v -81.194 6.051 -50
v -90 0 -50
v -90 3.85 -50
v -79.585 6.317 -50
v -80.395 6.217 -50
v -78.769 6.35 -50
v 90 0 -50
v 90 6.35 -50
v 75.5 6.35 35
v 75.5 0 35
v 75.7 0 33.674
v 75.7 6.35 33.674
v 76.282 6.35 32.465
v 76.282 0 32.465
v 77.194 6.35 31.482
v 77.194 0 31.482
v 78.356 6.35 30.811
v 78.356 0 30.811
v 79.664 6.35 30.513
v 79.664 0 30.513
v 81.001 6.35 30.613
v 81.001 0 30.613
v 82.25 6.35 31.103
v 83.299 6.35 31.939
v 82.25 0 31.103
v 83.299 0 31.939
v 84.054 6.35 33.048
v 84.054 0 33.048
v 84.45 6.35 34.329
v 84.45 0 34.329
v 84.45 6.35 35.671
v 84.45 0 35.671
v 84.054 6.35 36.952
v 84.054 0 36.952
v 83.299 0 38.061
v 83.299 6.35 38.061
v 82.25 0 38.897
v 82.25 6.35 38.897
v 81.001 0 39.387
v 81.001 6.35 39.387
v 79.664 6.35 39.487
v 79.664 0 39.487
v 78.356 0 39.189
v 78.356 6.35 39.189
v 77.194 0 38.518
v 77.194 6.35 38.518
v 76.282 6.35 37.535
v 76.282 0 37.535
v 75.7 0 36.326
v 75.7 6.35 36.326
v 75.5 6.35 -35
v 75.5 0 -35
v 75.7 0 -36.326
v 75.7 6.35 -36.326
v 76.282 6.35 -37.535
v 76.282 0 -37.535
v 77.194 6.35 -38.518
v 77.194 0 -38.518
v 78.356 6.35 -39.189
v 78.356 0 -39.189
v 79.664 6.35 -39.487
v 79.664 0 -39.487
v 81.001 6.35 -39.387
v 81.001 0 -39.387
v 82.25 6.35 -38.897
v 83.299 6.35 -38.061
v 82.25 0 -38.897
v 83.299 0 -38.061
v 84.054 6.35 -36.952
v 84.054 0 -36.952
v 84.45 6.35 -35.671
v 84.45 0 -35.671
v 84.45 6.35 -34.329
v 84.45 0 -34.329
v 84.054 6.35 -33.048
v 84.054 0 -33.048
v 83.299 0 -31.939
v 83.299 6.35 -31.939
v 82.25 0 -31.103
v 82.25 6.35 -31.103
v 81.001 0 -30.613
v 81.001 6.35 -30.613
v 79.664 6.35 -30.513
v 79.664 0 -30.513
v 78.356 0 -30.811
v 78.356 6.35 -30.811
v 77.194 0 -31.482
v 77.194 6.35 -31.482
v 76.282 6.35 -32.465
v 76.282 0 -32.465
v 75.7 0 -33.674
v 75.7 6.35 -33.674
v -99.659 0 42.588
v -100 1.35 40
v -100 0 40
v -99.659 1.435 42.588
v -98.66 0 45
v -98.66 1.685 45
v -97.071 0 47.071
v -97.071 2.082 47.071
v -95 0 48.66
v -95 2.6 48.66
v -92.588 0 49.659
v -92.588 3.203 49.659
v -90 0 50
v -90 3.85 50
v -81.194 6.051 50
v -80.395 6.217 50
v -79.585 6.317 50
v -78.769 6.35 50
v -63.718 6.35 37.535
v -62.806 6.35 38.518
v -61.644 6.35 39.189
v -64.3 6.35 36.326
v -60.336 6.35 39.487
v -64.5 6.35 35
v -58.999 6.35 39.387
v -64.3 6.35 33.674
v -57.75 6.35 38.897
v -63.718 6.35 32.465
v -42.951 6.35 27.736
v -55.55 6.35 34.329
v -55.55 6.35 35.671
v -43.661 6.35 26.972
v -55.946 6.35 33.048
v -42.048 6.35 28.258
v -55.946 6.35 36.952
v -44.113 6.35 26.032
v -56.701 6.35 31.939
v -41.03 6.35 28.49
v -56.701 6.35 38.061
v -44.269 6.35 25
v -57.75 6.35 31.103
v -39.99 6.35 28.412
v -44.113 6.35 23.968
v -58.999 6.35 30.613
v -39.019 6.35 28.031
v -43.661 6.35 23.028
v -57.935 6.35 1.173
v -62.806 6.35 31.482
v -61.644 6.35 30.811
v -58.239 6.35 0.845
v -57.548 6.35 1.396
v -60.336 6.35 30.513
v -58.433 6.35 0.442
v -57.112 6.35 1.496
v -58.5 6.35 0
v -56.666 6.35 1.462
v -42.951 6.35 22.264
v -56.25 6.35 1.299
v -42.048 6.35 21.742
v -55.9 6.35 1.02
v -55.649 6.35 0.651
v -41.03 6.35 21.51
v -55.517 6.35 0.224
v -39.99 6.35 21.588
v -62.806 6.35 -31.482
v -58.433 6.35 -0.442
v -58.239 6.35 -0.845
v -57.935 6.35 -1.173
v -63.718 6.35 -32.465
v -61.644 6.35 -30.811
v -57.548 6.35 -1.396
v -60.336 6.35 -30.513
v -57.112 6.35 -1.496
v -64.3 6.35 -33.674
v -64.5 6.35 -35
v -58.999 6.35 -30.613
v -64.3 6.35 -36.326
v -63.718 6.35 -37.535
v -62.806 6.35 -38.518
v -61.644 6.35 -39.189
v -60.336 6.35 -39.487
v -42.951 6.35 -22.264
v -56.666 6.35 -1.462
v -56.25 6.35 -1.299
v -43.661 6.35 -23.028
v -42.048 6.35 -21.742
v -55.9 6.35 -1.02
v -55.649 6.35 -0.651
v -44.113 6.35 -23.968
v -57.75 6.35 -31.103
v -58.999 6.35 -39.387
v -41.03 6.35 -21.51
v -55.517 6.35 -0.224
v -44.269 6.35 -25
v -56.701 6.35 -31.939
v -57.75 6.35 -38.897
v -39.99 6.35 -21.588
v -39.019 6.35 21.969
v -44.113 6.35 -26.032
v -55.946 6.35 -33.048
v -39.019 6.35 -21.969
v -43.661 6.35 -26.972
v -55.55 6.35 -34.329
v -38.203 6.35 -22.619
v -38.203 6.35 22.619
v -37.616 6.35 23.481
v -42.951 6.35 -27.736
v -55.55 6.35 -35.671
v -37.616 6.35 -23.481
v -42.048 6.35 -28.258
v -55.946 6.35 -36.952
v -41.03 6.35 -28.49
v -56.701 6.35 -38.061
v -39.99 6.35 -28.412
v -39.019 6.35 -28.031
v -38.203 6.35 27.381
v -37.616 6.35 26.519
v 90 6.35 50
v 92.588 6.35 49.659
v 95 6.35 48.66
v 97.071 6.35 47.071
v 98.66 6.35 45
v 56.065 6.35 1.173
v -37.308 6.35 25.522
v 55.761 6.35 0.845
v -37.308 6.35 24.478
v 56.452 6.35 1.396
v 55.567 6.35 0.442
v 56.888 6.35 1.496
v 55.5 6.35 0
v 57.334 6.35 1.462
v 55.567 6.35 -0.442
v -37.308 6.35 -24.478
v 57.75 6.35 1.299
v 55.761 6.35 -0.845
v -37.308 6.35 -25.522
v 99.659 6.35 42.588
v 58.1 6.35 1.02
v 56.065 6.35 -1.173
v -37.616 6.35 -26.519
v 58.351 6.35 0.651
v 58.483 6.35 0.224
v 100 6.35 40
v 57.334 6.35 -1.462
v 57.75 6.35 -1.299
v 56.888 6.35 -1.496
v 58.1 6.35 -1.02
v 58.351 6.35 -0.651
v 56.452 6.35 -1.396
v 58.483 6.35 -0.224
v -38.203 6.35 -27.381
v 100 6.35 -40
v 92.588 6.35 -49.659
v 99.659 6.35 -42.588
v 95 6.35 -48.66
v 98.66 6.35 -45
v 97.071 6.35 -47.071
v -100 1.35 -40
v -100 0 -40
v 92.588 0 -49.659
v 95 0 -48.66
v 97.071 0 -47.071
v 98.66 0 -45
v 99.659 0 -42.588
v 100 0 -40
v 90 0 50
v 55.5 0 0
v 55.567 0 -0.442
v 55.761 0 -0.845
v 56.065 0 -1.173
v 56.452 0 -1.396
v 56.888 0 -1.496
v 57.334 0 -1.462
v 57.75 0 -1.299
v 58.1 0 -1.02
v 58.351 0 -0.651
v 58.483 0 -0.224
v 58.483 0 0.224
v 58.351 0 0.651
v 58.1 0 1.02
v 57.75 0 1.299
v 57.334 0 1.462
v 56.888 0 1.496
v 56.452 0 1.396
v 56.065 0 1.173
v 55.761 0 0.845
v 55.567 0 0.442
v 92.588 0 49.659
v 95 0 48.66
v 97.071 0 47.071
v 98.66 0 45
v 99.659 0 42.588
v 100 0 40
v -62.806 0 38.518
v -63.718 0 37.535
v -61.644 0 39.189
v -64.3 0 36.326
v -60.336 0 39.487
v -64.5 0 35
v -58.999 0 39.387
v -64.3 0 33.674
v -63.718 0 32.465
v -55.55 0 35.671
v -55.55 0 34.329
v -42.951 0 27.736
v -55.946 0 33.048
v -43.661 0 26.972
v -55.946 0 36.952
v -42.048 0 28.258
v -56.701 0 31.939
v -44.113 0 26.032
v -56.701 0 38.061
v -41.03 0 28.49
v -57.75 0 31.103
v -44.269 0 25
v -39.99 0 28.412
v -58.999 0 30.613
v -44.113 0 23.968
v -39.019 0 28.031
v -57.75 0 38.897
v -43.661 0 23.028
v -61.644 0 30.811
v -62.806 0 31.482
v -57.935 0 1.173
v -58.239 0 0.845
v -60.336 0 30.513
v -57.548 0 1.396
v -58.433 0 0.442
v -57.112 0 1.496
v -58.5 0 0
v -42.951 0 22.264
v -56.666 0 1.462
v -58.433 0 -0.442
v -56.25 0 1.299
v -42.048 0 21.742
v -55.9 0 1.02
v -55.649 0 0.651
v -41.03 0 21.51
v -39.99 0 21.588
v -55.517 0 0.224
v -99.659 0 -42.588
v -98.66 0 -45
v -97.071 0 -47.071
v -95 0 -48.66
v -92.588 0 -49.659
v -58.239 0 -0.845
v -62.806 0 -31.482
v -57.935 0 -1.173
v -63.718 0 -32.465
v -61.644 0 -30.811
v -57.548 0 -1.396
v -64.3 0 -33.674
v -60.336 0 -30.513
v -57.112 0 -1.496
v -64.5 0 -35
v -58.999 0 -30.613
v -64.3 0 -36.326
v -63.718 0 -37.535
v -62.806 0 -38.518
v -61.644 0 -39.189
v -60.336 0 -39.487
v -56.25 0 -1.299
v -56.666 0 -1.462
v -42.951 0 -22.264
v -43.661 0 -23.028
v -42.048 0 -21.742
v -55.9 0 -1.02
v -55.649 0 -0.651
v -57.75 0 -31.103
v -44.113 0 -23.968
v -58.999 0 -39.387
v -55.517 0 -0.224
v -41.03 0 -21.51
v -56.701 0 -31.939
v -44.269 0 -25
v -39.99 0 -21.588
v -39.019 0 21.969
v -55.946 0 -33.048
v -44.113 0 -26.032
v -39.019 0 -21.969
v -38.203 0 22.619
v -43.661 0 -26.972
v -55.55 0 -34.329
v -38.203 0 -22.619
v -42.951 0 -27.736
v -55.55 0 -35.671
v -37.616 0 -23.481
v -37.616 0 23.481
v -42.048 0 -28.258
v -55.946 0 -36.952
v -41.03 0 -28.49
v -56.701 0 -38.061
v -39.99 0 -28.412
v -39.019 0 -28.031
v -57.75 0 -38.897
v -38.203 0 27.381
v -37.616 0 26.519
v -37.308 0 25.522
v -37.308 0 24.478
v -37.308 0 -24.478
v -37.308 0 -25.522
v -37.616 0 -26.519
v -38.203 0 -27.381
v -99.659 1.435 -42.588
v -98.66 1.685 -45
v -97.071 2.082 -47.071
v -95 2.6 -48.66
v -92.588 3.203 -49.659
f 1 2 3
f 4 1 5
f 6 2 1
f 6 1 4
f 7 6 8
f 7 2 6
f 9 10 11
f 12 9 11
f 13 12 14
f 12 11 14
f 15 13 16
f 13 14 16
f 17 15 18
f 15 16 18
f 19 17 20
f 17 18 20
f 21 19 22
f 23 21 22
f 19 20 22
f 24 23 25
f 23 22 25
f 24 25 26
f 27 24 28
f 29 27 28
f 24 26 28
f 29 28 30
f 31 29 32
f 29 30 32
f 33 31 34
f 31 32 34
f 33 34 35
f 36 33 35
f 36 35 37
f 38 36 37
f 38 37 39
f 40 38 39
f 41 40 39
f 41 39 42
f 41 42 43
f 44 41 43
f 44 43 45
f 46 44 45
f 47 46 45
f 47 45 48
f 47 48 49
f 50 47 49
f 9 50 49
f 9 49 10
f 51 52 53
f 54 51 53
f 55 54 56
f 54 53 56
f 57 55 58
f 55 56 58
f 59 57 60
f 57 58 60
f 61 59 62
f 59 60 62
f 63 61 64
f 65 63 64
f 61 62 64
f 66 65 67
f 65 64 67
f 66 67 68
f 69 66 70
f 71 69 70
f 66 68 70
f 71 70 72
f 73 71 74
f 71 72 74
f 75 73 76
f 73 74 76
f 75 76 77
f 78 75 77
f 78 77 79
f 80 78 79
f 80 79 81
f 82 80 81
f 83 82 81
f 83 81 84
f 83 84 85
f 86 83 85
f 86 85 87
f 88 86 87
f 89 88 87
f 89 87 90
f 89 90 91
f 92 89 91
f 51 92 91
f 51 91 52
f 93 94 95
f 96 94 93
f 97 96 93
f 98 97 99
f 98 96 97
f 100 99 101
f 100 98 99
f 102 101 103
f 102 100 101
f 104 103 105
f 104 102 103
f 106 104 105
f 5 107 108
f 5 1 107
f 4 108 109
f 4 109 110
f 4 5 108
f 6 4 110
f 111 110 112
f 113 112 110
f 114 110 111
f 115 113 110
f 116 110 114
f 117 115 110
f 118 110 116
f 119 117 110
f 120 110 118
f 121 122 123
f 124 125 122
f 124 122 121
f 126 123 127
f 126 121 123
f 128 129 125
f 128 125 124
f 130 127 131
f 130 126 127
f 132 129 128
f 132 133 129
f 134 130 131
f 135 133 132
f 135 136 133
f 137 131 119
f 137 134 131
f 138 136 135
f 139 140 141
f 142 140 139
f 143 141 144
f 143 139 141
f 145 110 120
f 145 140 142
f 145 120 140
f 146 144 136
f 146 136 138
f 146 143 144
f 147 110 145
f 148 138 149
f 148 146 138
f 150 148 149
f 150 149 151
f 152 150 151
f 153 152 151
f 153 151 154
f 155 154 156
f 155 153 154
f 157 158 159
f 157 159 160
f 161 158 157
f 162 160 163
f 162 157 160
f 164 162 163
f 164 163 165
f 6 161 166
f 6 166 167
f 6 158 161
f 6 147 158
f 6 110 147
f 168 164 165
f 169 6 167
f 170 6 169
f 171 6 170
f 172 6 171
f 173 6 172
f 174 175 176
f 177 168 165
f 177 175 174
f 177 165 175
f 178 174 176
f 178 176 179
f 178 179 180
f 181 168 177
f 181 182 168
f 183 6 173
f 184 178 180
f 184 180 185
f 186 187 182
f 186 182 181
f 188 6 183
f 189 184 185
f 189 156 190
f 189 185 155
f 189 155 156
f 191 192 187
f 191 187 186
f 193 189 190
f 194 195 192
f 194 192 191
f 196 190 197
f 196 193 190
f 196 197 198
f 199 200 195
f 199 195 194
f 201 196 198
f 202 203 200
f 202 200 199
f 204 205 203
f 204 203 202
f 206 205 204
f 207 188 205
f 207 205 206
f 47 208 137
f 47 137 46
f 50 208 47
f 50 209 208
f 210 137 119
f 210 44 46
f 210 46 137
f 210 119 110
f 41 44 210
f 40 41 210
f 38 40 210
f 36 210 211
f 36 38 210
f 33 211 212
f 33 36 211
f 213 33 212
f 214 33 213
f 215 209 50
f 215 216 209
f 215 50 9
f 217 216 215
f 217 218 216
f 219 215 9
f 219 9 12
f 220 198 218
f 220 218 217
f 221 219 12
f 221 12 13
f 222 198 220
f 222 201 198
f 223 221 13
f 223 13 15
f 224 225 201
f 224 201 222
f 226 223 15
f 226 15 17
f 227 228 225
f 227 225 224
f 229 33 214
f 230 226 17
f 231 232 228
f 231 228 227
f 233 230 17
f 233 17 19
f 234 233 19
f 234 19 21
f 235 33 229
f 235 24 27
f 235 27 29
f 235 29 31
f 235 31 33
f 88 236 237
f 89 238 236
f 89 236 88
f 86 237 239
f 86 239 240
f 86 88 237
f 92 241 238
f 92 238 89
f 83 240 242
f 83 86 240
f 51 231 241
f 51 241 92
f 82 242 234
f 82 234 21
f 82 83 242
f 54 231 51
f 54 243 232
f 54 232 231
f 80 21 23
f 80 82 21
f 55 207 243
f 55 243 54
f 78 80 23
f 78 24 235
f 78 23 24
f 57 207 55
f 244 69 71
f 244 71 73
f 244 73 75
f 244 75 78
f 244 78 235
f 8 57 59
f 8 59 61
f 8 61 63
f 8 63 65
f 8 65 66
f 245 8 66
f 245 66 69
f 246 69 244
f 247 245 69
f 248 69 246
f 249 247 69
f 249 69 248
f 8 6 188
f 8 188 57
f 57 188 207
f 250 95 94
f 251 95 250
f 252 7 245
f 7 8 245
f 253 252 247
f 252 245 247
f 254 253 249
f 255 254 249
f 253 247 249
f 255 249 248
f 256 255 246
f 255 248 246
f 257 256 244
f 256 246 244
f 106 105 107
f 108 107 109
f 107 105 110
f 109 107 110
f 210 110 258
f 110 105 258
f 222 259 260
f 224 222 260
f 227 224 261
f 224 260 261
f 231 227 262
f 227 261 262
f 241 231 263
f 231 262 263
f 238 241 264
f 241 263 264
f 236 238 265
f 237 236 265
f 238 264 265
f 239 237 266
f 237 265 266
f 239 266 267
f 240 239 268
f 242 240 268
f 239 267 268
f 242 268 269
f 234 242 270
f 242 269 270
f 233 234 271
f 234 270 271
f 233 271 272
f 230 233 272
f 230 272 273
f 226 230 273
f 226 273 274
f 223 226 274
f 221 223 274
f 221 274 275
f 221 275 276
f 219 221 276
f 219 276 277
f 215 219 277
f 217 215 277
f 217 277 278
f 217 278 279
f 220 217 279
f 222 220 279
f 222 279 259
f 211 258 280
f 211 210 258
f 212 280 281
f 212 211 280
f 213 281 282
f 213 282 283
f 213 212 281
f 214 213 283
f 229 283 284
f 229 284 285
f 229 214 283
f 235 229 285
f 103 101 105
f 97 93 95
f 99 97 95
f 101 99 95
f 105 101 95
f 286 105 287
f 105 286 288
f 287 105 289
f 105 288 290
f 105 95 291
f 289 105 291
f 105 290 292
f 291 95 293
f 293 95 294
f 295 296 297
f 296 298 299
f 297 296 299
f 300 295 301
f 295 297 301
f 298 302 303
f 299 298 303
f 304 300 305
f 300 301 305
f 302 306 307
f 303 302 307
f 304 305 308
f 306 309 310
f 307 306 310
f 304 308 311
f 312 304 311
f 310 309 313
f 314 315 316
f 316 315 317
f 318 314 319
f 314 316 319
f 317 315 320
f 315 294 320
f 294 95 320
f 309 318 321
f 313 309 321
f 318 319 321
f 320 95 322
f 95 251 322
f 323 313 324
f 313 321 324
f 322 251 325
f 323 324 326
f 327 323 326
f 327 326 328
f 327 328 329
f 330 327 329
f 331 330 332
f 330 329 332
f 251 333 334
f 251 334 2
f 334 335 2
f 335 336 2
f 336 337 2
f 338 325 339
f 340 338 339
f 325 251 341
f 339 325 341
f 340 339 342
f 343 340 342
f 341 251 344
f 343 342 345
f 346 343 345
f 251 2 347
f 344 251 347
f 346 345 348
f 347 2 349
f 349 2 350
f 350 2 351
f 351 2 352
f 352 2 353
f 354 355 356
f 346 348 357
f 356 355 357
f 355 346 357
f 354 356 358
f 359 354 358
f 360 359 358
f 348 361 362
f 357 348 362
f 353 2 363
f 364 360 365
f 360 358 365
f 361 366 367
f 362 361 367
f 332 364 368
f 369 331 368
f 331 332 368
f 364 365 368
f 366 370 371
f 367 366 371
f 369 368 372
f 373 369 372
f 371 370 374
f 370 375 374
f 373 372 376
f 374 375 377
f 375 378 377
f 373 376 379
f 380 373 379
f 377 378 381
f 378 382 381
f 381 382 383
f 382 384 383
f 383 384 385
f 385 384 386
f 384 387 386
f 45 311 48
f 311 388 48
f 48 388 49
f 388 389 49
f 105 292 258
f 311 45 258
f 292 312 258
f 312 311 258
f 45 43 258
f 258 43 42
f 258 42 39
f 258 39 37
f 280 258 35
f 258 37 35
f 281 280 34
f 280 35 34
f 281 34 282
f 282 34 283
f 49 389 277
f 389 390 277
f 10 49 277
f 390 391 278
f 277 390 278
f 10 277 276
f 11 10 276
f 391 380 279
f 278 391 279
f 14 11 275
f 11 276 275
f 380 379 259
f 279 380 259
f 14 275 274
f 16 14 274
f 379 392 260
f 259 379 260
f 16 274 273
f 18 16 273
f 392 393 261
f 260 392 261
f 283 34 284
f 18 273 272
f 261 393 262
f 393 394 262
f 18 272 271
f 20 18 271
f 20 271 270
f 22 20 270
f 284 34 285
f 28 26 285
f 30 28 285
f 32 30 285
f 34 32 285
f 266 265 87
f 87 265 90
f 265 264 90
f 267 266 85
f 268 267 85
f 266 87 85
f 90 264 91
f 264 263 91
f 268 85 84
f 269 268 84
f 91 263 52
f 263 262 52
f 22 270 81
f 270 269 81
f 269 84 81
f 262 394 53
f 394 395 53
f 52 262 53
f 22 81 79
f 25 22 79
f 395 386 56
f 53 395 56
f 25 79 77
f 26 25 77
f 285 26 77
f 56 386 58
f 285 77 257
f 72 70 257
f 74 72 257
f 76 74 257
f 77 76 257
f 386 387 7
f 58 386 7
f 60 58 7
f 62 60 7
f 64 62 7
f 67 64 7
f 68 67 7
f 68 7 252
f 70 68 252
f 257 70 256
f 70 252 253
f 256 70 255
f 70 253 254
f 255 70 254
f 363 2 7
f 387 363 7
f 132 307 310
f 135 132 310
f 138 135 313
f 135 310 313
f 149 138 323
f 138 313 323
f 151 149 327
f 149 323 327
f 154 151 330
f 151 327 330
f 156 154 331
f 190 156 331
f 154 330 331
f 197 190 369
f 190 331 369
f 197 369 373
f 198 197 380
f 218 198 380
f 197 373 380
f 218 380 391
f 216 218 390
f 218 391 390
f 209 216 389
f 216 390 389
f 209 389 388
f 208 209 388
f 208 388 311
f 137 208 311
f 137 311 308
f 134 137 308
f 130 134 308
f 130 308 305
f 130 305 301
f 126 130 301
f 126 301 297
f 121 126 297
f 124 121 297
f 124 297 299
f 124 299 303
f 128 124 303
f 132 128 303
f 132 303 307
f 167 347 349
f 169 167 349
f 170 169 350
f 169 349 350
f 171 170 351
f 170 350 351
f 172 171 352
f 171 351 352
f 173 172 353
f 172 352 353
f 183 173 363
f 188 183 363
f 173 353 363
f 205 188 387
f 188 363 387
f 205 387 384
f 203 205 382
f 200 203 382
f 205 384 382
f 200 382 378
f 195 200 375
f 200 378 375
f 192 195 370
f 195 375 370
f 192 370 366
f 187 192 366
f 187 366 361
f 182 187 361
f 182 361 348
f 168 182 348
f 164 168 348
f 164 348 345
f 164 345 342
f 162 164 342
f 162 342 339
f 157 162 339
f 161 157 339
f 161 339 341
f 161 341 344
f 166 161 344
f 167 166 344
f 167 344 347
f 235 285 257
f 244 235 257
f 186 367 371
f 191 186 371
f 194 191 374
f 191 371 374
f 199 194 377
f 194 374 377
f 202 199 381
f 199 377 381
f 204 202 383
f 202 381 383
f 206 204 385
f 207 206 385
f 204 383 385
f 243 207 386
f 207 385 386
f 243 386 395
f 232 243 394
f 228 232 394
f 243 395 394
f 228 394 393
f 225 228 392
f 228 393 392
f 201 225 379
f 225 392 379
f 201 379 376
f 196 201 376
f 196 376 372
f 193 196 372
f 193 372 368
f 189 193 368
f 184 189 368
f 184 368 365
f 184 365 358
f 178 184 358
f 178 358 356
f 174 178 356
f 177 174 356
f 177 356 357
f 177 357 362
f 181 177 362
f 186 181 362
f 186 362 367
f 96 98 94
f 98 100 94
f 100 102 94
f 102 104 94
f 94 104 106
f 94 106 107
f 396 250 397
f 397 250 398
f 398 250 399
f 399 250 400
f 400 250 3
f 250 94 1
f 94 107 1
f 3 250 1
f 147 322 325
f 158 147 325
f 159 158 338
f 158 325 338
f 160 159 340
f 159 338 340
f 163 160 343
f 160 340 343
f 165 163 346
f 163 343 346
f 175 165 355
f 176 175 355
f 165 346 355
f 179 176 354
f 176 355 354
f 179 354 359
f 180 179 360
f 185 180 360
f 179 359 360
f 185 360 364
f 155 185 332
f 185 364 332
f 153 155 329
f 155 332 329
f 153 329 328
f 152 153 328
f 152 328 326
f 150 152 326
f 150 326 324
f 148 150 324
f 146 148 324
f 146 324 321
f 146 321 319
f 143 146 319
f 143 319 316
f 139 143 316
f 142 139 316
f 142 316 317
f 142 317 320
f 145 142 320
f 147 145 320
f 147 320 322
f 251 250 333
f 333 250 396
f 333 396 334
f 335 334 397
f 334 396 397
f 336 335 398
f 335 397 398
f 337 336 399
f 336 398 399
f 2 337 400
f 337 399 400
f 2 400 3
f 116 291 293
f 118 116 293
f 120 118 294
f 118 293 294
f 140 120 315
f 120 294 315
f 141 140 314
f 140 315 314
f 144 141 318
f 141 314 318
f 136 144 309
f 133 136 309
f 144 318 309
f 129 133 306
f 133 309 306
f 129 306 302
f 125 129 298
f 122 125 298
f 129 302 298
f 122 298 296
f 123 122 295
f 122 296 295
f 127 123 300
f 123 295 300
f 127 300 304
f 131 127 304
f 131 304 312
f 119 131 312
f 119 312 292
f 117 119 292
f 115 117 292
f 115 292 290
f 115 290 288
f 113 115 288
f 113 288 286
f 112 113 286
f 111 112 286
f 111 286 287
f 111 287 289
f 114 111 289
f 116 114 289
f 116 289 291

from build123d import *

# Parameters (mm, degrees)
SKETCH1_W             = 200
SKETCH1_H             = 100
BOSS_EXTRUDE1_DEPTH   = 6.35
CHAMFER1_SIZE         = 5
CHAMFER1_SIZE2        = 20
FILLET1_R             = 10
F_3_0MM_DOWEL_HOLE1_D = 3
M8_CLEARANCE_HOLE1_D  = 9
F_6_0MM_DOWEL_HOLE1_D = 7


with BuildPart() as part:
    # Sketch1 → Boss-Extrude1 (new body)
    with BuildSketch(Plane(origin=(0, 0, 0), x_dir=(1, 0, 0), z_dir=(0, 1, 0))):
        Rectangle(SKETCH1_W, SKETCH1_H)
    extrude(amount=BOSS_EXTRUDE1_DEPTH)

    # Chamfer1
    chamfer1_edges = [part.edges().sort_by_distance(p)[0] for p in [
        (-100, 6.35, 0),
    ]]
    chamfer1_side = [part.faces().sort_by_distance(p)[0] for p in [
        (-100, 3.175, 0),
    ]]
    chamfer(chamfer1_edges, length=CHAMFER1_SIZE, length2=CHAMFER1_SIZE2, reference=chamfer1_side[0])

    # Fillet1
    fillet1_edges = [part.edges().sort_by_distance(p)[0] for p in [
        (-80, 6.35, 0),
        (-100, 0.675, 50),
        (-100, 0.675, -50),
        (100, 3.175, 50),
        (100, 3.175, -50),
    ]]
    fillet(fillet1_edges, radius=FILLET1_R)

    # Ø3.0mm Dowel Hole1 (through all)
    with Locations(Plane(origin=(0, 6.35, 0), x_dir=(1, 0, 0), z_dir=(0, 1, 0))):
        with Locations((-57, 0), (57, 0)):
            Hole(F_3_0MM_DOWEL_HOLE1_D / 2)

    # M8 Clearance Hole1 (through all)
    with Locations(Plane(origin=(0, 6.35, 0), x_dir=(1, 0, 0), z_dir=(0, 1, 0))):
        with Locations((-60, 35), (80, -35), (-60, -35), (80, 35)):
            Hole(M8_CLEARANCE_HOLE1_D / 2)

    # Ø6.0mm Dowel Hole1 (through all)
    with Locations(Plane(origin=(0, 6.35, 0), x_dir=(1, 0, 0), z_dir=(0, 1, 0))):
        with Locations((-40.768943744, 25), (-40.768943744, -25)):
            Hole(F_6_0MM_DOWEL_HOLE1_D / 2)


solid = part.part
